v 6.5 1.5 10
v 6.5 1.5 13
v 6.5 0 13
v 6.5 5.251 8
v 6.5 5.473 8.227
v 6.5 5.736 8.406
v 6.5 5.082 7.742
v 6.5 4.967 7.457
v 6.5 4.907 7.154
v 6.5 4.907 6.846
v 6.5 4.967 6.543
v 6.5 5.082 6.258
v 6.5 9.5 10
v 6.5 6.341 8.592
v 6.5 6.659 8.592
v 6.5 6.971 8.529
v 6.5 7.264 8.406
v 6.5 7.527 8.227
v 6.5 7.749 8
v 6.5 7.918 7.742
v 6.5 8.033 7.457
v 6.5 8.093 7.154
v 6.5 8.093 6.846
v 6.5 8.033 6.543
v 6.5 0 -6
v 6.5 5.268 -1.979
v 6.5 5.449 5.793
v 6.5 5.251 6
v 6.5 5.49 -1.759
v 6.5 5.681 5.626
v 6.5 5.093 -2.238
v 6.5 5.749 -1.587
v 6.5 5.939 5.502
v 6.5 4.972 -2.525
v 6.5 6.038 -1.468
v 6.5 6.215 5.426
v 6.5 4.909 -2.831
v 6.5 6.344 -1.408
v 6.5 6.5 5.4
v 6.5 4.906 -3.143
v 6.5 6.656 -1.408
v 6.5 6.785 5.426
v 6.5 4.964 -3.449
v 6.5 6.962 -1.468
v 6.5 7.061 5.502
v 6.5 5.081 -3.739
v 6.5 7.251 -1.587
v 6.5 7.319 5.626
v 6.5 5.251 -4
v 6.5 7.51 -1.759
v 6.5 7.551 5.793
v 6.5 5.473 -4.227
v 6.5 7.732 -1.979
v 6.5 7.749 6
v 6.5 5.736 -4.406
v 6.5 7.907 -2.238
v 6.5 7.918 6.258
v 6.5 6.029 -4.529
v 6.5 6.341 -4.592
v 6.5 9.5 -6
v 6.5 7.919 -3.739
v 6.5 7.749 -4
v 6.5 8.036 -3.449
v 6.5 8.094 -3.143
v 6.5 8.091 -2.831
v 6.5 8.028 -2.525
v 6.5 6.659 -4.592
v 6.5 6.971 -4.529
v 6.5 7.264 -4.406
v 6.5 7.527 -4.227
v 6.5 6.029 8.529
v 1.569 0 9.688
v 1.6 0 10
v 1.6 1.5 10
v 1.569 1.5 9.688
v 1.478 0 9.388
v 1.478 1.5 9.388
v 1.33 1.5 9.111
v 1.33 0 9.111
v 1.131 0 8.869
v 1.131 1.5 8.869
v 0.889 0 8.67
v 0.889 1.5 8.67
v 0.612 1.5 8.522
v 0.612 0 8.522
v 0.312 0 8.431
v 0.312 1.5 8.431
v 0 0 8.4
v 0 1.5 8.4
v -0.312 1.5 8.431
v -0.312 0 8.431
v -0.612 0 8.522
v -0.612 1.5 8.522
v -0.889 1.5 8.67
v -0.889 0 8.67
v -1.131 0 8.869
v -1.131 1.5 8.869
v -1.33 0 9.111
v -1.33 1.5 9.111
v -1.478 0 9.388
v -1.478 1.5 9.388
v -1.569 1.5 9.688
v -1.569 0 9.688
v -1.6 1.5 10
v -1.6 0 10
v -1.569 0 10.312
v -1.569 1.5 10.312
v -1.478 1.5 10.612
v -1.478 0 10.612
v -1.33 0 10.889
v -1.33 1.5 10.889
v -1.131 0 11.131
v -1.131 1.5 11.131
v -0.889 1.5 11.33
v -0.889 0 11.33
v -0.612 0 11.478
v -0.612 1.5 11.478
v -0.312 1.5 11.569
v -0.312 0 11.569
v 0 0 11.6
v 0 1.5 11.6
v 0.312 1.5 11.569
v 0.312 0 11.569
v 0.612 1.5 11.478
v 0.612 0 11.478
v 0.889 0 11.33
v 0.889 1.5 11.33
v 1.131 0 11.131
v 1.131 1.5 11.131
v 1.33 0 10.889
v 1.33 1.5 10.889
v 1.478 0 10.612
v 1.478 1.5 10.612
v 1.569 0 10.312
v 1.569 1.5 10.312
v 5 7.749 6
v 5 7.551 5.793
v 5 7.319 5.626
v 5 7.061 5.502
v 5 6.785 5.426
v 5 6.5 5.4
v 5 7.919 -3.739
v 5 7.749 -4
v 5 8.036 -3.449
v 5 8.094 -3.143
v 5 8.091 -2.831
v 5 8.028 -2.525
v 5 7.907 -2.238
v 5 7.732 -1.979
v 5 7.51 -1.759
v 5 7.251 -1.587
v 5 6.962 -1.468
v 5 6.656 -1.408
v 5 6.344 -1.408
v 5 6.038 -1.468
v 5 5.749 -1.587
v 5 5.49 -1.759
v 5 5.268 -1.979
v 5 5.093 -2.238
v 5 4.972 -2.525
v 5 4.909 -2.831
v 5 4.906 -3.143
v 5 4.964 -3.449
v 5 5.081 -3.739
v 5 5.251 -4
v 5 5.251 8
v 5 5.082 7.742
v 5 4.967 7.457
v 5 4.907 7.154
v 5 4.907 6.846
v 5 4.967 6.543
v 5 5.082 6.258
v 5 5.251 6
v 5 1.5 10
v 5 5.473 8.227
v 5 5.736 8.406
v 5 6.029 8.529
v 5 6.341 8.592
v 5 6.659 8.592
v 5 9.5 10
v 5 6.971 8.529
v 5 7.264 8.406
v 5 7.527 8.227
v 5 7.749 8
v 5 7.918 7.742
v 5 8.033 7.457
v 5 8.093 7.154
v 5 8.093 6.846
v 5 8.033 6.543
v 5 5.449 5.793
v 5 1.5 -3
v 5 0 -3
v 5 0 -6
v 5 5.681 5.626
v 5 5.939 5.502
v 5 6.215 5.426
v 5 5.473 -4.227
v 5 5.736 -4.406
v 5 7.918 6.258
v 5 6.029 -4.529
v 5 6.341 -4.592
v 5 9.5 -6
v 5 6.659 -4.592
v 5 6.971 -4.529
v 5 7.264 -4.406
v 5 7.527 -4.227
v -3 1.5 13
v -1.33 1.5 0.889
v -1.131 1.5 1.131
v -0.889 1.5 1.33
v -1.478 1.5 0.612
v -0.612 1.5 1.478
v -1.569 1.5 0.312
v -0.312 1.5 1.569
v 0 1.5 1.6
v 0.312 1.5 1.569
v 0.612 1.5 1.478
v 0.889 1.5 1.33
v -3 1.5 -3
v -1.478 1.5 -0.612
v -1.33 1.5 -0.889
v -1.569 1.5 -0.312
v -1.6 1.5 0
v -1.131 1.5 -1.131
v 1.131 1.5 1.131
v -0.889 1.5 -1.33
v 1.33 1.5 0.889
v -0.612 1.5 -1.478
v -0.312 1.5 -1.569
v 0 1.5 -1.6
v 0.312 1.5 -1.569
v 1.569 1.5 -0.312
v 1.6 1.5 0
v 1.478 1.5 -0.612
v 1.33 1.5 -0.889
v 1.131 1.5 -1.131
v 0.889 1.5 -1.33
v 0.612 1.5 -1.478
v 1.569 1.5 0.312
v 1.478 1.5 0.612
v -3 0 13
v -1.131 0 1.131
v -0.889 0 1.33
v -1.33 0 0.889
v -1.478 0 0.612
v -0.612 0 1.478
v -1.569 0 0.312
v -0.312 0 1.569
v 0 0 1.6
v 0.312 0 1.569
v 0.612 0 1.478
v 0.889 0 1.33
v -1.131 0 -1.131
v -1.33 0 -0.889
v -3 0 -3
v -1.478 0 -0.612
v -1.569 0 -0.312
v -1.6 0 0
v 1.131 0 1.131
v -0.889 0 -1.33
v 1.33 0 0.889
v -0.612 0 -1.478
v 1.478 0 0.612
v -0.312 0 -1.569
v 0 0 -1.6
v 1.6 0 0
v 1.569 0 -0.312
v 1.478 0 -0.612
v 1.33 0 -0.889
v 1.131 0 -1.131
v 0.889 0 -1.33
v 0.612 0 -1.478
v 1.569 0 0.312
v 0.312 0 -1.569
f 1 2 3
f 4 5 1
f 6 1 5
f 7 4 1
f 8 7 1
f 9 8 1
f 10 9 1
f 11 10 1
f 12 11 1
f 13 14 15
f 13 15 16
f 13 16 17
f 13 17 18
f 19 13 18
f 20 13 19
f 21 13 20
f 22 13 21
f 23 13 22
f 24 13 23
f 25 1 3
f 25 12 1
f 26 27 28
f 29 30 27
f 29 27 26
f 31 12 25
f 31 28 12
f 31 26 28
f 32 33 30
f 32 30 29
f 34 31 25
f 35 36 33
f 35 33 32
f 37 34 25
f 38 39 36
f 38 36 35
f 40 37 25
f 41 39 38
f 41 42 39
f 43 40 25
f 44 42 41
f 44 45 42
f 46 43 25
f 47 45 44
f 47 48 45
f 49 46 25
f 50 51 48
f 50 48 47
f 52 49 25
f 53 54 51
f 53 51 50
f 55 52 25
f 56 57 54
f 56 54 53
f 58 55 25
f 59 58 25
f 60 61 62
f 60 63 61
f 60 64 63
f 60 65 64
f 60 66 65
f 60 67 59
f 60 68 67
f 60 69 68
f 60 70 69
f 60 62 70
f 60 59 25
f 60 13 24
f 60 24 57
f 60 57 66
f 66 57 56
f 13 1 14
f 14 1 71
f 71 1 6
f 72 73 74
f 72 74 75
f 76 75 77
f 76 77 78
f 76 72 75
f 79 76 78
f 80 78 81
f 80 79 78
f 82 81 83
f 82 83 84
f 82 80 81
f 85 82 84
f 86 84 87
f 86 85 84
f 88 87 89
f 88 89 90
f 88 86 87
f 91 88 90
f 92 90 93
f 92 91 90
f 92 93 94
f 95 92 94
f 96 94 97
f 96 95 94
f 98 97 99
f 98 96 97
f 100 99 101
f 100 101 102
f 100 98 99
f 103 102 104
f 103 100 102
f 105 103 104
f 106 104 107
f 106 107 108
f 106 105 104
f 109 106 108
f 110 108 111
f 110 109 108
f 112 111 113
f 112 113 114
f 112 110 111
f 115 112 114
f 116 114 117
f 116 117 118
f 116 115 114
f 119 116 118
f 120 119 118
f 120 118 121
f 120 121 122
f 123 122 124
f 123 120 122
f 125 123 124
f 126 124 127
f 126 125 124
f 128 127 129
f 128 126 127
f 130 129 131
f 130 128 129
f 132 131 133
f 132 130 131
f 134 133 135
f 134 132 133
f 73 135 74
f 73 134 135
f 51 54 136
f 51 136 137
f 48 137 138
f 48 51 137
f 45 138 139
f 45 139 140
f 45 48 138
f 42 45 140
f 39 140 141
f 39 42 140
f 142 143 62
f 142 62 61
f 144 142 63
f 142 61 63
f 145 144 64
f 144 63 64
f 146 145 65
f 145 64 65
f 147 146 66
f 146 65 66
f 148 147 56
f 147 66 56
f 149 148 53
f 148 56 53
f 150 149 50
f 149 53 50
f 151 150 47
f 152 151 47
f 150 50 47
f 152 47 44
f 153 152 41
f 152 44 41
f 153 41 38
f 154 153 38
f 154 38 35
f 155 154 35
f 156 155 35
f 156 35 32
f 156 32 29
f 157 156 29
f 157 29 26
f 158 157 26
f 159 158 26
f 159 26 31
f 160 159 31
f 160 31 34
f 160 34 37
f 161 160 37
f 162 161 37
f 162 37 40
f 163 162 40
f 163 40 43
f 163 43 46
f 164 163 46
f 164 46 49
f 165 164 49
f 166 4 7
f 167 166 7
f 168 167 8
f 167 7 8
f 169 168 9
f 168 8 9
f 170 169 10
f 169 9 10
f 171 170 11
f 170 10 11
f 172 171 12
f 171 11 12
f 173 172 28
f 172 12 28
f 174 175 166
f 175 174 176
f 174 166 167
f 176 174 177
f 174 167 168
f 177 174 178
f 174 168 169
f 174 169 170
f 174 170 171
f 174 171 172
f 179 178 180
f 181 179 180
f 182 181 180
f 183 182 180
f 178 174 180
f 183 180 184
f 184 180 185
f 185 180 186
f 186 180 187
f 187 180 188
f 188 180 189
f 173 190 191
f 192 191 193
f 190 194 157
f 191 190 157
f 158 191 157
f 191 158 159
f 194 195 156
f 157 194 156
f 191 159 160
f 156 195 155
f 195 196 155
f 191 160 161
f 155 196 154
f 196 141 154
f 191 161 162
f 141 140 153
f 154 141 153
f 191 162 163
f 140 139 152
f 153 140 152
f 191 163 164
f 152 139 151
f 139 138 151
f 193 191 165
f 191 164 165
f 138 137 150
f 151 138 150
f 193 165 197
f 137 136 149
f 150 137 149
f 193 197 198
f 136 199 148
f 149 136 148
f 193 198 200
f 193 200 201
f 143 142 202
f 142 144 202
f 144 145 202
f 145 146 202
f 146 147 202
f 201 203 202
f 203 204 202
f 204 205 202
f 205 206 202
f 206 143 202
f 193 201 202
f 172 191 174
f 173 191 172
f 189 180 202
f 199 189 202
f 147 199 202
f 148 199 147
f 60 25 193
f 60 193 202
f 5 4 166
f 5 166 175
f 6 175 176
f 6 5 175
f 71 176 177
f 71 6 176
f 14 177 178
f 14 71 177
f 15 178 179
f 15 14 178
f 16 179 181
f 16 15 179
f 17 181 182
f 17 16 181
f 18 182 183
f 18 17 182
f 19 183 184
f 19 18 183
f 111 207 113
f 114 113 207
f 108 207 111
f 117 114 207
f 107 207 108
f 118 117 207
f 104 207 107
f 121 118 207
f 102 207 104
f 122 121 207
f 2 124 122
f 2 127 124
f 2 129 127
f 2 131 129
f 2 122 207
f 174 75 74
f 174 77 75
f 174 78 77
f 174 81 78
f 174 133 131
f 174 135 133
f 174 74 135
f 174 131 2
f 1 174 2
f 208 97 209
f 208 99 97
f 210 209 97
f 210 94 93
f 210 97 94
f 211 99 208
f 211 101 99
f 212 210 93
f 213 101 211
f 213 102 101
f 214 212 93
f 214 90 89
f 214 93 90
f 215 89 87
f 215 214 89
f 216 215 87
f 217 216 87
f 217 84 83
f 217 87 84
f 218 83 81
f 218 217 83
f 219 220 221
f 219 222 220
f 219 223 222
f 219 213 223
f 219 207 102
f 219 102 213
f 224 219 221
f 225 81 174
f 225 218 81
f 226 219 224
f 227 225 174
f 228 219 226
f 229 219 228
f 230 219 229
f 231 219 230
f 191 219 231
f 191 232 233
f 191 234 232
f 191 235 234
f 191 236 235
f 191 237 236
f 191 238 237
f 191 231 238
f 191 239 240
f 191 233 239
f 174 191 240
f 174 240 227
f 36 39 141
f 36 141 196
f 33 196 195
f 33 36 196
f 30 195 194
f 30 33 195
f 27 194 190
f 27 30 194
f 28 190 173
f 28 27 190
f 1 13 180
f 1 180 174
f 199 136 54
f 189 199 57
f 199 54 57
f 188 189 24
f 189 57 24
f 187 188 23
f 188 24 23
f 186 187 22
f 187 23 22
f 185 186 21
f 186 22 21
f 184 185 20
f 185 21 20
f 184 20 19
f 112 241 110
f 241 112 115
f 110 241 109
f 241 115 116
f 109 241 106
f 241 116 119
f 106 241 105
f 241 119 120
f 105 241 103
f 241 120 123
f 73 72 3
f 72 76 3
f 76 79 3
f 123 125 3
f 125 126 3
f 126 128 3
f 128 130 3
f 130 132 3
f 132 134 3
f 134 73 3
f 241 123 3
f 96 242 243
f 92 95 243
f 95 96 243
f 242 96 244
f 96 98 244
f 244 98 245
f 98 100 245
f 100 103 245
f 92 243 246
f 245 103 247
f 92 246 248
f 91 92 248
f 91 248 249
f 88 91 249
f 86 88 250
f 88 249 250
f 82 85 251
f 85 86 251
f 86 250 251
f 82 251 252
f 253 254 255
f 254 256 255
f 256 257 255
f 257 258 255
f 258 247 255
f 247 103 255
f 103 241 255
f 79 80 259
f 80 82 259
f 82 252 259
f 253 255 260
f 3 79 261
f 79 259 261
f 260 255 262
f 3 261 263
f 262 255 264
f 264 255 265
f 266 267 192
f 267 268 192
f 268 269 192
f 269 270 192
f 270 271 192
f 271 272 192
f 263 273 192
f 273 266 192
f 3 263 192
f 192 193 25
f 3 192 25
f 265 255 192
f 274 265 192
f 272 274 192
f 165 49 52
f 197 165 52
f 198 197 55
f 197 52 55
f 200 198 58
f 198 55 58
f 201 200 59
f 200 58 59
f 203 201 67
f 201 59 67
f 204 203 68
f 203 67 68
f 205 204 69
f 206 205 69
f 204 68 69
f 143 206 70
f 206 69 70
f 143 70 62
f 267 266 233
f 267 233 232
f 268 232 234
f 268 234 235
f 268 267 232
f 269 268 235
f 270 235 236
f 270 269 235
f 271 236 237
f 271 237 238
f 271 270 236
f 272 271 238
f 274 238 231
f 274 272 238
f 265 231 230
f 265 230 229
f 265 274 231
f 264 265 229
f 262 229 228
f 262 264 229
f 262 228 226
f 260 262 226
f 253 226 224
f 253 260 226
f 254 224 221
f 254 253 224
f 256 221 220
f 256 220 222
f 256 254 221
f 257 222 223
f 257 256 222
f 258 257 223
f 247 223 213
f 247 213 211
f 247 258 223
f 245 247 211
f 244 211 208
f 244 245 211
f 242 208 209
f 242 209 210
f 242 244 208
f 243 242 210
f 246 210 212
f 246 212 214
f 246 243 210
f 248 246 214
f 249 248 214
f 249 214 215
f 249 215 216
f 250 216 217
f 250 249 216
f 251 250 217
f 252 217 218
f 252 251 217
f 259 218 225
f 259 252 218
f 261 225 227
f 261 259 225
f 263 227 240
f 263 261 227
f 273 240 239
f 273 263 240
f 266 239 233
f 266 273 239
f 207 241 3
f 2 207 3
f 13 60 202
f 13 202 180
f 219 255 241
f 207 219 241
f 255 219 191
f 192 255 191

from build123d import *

# Parameters (mm, degrees)
SKETCH1_R           = 1.6
BOSS_EXTRUDE2_DEPTH = 1.5
SKETCH3_W           = 1.5
SKETCH3_H           = 21
BOSS_EXTRUDE3_DEPTH = 8
SKETCH4_R           = 1.6
CUT_EXTRUDE2_DEPTH  = 8
SKETCH6_W           = 5
SKETCH6_H           = 8
CUT_EXTRUDE3_DEPTH  = 8
SKETCH7_W           = 8
SKETCH7_H           = 5
CUT_EXTRUDE4_DEPTH  = 8
SKETCH8_R           = 1.6
SKETCH8_W           = 2
SKETCH8_H           = 9.5
CUT_EXTRUDE5_DEPTH  = 1.5
BOSS_EXTRUDE4_DEPTH = 1.5


with BuildPart() as part:
    # Sketch1 → Boss-Extrude2 (new body)
    with BuildSketch(Plane(origin=(0, 0, 0), x_dir=(1, 0, 0), z_dir=(0, 1, 0))):
        Polygon((-3, 8), (-3, -13), (0, -13), (6.5, -13), (6.5, 0), (6.5, 8), (0, 8), align=None)
        Circle(SKETCH1_R, mode=Mode.SUBTRACT)
        with Locations((0, -10)):
            Circle(SKETCH1_R, mode=Mode.SUBTRACT)
    extrude(amount=BOSS_EXTRUDE2_DEPTH)

    # Sketch3 → Boss-Extrude3 (add)
    with BuildSketch(Plane(origin=(0, 1.5, 0), x_dir=(1, 0, 0), z_dir=(0, 1, 0))):
        with Locations((5.75, -2.5)):
            Rectangle(SKETCH3_W, SKETCH3_H)
    extrude(amount=BOSS_EXTRUDE3_DEPTH)

    # Sketch4 → Cut-Extrude2 (cut)
    with BuildSketch(Plane.ZY.offset(-5)):
        with Locations((-5, 6.5)):
            Circle(SKETCH4_R)
        with Locations((5, 6.5)):
            Circle(SKETCH4_R)
    extrude(amount=-CUT_EXTRUDE2_DEPTH, mode=Mode.SUBTRACT)

    # Sketch6 → Cut-Extrude3 (cut)
    with BuildSketch(Plane.ZY.offset(-5)):
        with Locations((10.5, 5.5)):
            Rectangle(SKETCH6_W, SKETCH6_H)
    extrude(amount=-CUT_EXTRUDE3_DEPTH, mode=Mode.SUBTRACT)

    # Sketch7 → Cut-Extrude4 (cut)
    with BuildSketch(Plane(origin=(0, 1.5, 0), x_dir=(1, 0, 0), z_dir=(0, 1, 0))):
        with Locations((1, 5.5)):
            Rectangle(SKETCH7_W, SKETCH7_H)
    extrude(amount=-CUT_EXTRUDE4_DEPTH, mode=Mode.SUBTRACT)

    # Sketch8 → Cut-Extrude5 (cut)
    with BuildSketch(Plane(origin=(6.5, 0, 0), x_dir=(0, 0, -1), z_dir=(1, 0, 0))):
        with Locations((-7, 6.5)):
            Circle(SKETCH8_R)
        with Locations((3, 6.5)):
            Circle(SKETCH8_R)
        with Locations((7, 4.75)):
            Rectangle(SKETCH8_W, SKETCH8_H)
    extrude(amount=-CUT_EXTRUDE5_DEPTH, mode=Mode.SUBTRACT)

    # Sketch9 → Boss-Extrude4 (add)
    with BuildSketch(Plane(origin=(6.5, 0, 0), x_dir=(0, 0, -1), z_dir=(1, 0, 0))):
        with BuildLine():
            Line((-8, 7.7489996), (-8, 9.5))
            Line((-8, 9.5), (-10, 9.5))
            Line((-10, 9.5), (-10, 1.5))
            Line((-10, 1.5), (-8, 1.5))
            Line((-8, 1.5), (-8, 5.2510004))
            ThreePointArc((-8, 5.2510004), (-8.6, 6.5), (-8, 7.7489996))
        make_face()
        with BuildLine():
            ThreePointArc((-6, 5.2510004), (-3.4, 6.5), (-6, 7.7489996))
            ThreePointArc((-6, 7.7489996), (-5.55777949, 7.192820323), (-5.4, 6.5))
            ThreePointArc((-5.4, 6.5), (-5.55777949, 5.807179677), (-6, 5.2510004))
        make_face()
        with BuildLine():
            ThreePointArc((4, 5.2510004), (4.6, 6.5), (4, 7.7489996))
            ThreePointArc((4, 7.7489996), (5, 8.1), (6, 7.7489996))
            Line((6, 7.7489996), (6, 5.2510004))
            ThreePointArc((6, 5.2510004), (5, 4.9), (4, 5.2510004))
        make_face()
        with BuildLine():
            Line((6, 0), (6, 5.2510004))
            ThreePointArc((6, 5.2510004), (5, 4.9), (4, 5.2510004))
            ThreePointArc((4, 5.2510004), (1.4, 6.5), (4, 7.7489996))
            ThreePointArc((4, 7.7489996), (5, 8.1), (6, 7.7489996))
            Line((6, 7.7489996), (6, 9.5))
            Line((6, 9.5), (-8, 9.5))
            Line((-8, 9.5), (-8, 7.7489996))
            ThreePointArc((-8, 7.7489996), (-7, 8.1), (-6, 7.7489996))
            ThreePointArc((-6, 7.7489996), (-3.4, 6.5), (-6, 5.2510004))
            ThreePointArc((-6, 5.2510004), (-7, 4.9), (-8, 5.2510004))
            Line((-8, 5.2510004), (-8, 1.5))
            Line((-8, 1.5), (-13, 1.5))
            Line((-13, 1.5), (-13, 0))
            Line((-13, 0), (6, 0))
        make_face()
    extrude(amount=-BOSS_EXTRUDE4_DEPTH)


solid = part.part
